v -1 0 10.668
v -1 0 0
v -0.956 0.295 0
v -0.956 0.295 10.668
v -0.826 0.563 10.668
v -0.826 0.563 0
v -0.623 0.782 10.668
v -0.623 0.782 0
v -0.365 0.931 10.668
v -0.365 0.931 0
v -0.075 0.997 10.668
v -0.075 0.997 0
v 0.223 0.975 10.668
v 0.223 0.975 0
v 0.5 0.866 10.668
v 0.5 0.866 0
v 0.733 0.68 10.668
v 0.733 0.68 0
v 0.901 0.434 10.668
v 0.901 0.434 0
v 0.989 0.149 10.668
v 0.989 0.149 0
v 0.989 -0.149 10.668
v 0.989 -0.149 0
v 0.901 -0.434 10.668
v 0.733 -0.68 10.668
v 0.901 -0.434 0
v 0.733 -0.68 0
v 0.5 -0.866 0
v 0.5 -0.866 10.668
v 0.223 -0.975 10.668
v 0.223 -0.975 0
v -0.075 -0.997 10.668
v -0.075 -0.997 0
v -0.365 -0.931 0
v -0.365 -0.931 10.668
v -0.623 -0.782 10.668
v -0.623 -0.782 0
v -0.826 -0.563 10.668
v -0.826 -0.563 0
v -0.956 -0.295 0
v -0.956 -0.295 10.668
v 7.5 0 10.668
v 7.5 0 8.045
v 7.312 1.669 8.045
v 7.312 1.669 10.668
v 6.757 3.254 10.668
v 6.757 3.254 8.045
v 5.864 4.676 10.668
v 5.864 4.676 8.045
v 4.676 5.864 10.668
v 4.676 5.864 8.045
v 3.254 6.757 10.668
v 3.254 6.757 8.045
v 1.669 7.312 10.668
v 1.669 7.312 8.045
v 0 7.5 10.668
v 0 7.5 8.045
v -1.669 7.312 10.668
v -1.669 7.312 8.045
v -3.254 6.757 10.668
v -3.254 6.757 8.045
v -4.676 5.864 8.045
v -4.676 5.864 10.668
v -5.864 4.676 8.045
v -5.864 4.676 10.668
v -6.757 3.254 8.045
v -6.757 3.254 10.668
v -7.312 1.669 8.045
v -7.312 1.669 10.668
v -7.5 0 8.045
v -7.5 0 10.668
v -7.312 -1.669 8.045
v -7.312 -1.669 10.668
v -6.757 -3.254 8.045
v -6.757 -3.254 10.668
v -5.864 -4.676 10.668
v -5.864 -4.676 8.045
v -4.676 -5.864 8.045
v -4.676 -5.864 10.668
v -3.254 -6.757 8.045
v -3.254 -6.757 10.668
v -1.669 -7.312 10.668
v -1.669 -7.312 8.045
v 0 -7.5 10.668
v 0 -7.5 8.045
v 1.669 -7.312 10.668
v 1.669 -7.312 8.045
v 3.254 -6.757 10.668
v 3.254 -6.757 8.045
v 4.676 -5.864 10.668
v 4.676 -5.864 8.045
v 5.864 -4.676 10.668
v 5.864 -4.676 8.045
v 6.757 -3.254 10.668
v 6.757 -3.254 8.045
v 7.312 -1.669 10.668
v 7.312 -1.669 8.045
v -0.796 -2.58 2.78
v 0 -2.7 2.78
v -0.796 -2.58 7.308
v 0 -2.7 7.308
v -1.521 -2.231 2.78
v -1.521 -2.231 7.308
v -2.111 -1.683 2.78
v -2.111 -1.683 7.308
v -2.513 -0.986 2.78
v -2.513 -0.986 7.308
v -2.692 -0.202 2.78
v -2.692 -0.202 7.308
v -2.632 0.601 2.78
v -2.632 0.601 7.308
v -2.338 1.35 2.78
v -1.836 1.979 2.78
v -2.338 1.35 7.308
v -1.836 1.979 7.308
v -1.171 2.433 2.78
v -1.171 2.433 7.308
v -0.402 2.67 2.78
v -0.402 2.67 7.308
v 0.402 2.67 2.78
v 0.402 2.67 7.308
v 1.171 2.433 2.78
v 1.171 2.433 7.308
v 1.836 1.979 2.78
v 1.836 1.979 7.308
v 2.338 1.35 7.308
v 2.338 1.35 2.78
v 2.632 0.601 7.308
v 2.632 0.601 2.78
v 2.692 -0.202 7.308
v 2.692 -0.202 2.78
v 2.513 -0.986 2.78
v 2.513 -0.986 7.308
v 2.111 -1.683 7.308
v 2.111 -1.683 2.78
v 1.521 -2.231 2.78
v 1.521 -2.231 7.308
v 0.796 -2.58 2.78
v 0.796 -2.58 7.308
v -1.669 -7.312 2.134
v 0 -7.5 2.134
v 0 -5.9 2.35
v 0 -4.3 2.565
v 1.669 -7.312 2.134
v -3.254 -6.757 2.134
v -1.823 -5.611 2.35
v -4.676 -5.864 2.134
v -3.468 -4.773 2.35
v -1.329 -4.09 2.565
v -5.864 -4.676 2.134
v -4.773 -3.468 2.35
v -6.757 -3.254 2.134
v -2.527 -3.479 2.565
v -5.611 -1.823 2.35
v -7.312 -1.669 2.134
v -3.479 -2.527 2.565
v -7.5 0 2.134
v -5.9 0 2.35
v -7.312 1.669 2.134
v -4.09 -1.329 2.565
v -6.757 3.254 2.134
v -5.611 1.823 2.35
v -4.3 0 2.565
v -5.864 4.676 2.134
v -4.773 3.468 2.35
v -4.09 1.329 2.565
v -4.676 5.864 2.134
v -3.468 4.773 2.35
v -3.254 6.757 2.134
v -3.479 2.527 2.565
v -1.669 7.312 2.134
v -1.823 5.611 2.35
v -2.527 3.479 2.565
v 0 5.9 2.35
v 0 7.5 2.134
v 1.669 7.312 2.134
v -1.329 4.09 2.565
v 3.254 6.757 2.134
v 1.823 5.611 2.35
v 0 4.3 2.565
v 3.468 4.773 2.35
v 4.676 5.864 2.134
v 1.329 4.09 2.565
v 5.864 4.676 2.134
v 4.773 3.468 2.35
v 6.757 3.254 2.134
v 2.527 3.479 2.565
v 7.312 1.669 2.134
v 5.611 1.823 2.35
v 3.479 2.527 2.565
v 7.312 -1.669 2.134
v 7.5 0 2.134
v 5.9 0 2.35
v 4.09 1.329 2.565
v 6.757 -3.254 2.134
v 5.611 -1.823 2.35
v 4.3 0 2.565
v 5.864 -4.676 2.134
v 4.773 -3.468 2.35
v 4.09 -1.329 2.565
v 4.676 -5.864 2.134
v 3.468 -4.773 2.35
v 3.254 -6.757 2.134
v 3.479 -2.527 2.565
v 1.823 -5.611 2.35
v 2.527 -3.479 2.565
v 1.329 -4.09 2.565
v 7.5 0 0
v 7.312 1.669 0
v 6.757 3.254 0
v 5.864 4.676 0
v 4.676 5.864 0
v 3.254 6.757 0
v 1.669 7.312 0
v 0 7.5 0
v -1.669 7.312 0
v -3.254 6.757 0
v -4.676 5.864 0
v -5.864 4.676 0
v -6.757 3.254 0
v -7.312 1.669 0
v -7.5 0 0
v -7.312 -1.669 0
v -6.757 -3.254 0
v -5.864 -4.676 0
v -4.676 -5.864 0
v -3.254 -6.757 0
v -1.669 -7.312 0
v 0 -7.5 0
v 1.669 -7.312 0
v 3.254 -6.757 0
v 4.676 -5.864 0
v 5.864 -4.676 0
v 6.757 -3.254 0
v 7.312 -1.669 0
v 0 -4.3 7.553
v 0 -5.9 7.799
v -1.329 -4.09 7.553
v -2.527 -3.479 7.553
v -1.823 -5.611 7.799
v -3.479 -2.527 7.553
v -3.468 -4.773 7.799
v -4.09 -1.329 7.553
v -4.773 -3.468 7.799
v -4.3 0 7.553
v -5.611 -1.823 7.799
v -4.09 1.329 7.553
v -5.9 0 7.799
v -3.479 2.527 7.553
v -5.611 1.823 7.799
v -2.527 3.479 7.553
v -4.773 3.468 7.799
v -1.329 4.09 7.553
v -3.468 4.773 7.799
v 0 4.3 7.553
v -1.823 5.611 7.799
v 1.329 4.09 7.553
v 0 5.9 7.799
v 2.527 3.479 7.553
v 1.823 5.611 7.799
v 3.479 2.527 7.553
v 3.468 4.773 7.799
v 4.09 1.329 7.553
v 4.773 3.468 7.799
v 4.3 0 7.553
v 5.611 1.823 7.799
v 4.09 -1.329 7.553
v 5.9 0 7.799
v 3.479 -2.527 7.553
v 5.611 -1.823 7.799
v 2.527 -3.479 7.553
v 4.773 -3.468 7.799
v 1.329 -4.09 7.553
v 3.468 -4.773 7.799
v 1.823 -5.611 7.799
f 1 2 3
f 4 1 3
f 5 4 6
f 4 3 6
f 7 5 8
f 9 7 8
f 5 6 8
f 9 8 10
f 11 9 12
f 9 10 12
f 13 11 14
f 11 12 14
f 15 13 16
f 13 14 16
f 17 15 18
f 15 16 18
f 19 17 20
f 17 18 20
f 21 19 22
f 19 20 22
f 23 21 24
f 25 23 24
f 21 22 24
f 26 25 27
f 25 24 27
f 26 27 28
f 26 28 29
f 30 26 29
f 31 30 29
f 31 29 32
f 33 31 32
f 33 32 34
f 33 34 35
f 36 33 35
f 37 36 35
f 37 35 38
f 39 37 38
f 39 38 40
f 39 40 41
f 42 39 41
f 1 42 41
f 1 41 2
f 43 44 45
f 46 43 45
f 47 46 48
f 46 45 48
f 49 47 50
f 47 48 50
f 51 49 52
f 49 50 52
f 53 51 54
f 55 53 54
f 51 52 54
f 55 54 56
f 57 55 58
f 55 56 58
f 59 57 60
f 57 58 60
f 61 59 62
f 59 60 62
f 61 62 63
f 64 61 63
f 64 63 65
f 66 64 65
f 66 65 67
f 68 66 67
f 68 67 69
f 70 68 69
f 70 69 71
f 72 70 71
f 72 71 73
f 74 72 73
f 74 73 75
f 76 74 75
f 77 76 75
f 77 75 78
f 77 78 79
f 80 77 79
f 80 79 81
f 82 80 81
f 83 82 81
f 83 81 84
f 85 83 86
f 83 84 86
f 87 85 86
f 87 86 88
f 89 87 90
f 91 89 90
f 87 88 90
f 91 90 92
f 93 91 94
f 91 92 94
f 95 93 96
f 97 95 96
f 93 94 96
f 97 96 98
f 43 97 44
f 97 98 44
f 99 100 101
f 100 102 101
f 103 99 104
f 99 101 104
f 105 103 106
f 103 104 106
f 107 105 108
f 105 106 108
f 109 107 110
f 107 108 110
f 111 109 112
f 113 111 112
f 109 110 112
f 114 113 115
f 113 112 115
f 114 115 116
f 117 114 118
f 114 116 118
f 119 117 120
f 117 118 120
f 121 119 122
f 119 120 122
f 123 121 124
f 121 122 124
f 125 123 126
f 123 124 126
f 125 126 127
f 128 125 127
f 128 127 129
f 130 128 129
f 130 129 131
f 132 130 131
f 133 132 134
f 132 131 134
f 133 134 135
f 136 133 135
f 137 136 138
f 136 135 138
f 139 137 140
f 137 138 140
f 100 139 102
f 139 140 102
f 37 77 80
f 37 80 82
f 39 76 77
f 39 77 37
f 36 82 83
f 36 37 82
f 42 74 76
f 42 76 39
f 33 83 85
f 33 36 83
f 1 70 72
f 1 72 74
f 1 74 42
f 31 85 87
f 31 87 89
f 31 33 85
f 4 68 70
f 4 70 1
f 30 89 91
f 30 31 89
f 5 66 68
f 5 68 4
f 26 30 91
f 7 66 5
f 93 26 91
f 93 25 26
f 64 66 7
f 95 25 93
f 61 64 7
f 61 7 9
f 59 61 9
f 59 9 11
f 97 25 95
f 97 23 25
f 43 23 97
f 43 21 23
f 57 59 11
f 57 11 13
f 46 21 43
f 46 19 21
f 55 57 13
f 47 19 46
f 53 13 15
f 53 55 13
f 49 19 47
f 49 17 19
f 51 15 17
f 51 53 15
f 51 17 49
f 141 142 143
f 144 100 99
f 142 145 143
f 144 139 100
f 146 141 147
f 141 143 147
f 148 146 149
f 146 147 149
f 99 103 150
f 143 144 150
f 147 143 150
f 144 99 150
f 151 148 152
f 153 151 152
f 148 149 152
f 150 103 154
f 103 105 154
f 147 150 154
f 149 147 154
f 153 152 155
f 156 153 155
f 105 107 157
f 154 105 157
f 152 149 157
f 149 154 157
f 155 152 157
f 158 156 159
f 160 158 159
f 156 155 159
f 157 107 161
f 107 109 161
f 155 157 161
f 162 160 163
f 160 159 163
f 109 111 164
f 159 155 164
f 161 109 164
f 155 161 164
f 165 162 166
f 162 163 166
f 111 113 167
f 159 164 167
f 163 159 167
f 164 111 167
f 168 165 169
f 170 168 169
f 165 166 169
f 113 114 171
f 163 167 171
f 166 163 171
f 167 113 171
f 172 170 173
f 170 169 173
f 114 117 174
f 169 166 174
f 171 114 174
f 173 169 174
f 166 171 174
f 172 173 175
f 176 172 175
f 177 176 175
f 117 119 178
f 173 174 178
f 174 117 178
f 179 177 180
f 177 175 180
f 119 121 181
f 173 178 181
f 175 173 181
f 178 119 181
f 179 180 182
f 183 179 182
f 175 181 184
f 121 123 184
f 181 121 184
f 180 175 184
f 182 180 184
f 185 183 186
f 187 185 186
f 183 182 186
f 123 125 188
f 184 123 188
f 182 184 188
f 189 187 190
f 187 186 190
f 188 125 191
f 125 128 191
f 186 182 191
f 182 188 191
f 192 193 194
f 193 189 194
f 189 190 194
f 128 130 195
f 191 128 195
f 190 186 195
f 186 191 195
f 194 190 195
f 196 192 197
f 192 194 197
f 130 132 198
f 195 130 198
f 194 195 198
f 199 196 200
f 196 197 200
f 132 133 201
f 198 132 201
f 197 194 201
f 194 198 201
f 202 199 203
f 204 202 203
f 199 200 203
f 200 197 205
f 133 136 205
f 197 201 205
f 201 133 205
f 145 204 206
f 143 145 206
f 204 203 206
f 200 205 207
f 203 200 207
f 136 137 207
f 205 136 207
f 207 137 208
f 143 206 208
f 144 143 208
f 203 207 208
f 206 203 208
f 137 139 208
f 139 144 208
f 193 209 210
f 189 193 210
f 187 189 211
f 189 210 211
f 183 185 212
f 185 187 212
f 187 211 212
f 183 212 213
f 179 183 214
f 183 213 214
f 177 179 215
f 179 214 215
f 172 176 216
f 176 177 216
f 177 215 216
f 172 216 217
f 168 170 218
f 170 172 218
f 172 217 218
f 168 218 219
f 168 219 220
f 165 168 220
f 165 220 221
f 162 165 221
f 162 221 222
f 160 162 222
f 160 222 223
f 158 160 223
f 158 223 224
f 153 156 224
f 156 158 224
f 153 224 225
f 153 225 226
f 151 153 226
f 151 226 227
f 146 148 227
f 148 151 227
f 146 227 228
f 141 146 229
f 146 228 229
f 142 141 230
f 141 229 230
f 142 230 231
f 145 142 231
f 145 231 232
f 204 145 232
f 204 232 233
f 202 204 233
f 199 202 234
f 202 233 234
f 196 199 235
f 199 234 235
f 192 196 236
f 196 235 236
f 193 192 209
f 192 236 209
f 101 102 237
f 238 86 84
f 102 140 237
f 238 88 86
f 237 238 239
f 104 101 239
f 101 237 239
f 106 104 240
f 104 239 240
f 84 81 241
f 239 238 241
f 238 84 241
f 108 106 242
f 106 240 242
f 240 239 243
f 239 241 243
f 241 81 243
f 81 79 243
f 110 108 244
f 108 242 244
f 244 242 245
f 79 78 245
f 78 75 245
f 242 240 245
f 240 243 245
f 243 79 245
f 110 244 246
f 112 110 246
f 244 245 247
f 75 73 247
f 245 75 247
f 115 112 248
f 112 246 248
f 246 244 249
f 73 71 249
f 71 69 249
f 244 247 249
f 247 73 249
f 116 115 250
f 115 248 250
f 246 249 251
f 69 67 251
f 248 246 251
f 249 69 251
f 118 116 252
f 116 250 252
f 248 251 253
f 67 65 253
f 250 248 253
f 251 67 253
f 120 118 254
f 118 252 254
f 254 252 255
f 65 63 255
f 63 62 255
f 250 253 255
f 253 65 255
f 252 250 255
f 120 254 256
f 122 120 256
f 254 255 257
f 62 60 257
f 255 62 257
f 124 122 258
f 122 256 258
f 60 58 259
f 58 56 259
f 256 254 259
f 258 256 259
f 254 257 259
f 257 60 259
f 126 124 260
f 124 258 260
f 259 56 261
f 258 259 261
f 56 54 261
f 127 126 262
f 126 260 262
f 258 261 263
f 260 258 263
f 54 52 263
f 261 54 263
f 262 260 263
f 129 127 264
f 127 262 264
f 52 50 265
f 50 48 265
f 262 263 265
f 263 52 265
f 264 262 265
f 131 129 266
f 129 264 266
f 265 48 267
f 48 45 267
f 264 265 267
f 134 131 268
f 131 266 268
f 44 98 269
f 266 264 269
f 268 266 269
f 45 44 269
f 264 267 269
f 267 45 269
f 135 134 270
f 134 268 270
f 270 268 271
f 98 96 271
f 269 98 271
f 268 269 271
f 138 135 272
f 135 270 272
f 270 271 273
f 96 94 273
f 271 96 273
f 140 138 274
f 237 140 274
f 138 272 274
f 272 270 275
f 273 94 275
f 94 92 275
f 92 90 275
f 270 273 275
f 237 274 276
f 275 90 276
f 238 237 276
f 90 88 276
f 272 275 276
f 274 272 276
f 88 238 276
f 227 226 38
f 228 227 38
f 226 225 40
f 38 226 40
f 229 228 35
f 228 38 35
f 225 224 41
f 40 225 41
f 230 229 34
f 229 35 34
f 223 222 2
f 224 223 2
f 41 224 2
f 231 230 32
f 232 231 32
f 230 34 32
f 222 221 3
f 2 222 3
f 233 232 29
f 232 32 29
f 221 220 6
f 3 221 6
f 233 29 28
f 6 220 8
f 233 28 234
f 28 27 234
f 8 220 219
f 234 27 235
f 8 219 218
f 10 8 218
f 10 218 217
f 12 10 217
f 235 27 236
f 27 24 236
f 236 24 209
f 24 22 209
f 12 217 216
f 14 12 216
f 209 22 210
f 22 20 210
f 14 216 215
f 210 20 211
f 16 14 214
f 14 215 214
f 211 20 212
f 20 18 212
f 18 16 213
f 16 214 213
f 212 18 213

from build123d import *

# Parameters (mm, degrees)
F0_R     = 7.5
F1_DEPTH = 10.668
F5_D     = 2


with BuildPart() as f1:
    # F0 (on Top) → F1 (new body)
    with BuildSketch(Plane.XY):
        Circle(F0_R)
    extrude(amount=F1_DEPTH)

    # F2 (on Right) → F3 (revolve, cut)
    with BuildSketch(Plane.YZ):
        with BuildLine():
            Line((-11.611987, 8.67579), (-11.611987, 7.502463))
            ThreePointArc((-11.611987, 7.502463), (-13.319947, 5.118554), (-11.587891, 2.752094))
            Line((-11.587891, 2.752094), (-11.587891, 1.583694))
            Line((-11.587891, 1.583694), (-2.7, 2.780473))
            Line((-2.7, 2.780473), (-2.7, 7.307734))
            Line((-2.7, 7.307734), (-11.611987, 8.67579))
        make_face()
    revolve(axis=Axis((0, 0, 0), (0, 0, -1)), mode=Mode.SUBTRACT)

    # F5 (through all)
    with Locations(Plane.XY.offset(10.668)):
        with Locations((0, 0)):
            Hole(F5_D / 2)


solid = f1.part
